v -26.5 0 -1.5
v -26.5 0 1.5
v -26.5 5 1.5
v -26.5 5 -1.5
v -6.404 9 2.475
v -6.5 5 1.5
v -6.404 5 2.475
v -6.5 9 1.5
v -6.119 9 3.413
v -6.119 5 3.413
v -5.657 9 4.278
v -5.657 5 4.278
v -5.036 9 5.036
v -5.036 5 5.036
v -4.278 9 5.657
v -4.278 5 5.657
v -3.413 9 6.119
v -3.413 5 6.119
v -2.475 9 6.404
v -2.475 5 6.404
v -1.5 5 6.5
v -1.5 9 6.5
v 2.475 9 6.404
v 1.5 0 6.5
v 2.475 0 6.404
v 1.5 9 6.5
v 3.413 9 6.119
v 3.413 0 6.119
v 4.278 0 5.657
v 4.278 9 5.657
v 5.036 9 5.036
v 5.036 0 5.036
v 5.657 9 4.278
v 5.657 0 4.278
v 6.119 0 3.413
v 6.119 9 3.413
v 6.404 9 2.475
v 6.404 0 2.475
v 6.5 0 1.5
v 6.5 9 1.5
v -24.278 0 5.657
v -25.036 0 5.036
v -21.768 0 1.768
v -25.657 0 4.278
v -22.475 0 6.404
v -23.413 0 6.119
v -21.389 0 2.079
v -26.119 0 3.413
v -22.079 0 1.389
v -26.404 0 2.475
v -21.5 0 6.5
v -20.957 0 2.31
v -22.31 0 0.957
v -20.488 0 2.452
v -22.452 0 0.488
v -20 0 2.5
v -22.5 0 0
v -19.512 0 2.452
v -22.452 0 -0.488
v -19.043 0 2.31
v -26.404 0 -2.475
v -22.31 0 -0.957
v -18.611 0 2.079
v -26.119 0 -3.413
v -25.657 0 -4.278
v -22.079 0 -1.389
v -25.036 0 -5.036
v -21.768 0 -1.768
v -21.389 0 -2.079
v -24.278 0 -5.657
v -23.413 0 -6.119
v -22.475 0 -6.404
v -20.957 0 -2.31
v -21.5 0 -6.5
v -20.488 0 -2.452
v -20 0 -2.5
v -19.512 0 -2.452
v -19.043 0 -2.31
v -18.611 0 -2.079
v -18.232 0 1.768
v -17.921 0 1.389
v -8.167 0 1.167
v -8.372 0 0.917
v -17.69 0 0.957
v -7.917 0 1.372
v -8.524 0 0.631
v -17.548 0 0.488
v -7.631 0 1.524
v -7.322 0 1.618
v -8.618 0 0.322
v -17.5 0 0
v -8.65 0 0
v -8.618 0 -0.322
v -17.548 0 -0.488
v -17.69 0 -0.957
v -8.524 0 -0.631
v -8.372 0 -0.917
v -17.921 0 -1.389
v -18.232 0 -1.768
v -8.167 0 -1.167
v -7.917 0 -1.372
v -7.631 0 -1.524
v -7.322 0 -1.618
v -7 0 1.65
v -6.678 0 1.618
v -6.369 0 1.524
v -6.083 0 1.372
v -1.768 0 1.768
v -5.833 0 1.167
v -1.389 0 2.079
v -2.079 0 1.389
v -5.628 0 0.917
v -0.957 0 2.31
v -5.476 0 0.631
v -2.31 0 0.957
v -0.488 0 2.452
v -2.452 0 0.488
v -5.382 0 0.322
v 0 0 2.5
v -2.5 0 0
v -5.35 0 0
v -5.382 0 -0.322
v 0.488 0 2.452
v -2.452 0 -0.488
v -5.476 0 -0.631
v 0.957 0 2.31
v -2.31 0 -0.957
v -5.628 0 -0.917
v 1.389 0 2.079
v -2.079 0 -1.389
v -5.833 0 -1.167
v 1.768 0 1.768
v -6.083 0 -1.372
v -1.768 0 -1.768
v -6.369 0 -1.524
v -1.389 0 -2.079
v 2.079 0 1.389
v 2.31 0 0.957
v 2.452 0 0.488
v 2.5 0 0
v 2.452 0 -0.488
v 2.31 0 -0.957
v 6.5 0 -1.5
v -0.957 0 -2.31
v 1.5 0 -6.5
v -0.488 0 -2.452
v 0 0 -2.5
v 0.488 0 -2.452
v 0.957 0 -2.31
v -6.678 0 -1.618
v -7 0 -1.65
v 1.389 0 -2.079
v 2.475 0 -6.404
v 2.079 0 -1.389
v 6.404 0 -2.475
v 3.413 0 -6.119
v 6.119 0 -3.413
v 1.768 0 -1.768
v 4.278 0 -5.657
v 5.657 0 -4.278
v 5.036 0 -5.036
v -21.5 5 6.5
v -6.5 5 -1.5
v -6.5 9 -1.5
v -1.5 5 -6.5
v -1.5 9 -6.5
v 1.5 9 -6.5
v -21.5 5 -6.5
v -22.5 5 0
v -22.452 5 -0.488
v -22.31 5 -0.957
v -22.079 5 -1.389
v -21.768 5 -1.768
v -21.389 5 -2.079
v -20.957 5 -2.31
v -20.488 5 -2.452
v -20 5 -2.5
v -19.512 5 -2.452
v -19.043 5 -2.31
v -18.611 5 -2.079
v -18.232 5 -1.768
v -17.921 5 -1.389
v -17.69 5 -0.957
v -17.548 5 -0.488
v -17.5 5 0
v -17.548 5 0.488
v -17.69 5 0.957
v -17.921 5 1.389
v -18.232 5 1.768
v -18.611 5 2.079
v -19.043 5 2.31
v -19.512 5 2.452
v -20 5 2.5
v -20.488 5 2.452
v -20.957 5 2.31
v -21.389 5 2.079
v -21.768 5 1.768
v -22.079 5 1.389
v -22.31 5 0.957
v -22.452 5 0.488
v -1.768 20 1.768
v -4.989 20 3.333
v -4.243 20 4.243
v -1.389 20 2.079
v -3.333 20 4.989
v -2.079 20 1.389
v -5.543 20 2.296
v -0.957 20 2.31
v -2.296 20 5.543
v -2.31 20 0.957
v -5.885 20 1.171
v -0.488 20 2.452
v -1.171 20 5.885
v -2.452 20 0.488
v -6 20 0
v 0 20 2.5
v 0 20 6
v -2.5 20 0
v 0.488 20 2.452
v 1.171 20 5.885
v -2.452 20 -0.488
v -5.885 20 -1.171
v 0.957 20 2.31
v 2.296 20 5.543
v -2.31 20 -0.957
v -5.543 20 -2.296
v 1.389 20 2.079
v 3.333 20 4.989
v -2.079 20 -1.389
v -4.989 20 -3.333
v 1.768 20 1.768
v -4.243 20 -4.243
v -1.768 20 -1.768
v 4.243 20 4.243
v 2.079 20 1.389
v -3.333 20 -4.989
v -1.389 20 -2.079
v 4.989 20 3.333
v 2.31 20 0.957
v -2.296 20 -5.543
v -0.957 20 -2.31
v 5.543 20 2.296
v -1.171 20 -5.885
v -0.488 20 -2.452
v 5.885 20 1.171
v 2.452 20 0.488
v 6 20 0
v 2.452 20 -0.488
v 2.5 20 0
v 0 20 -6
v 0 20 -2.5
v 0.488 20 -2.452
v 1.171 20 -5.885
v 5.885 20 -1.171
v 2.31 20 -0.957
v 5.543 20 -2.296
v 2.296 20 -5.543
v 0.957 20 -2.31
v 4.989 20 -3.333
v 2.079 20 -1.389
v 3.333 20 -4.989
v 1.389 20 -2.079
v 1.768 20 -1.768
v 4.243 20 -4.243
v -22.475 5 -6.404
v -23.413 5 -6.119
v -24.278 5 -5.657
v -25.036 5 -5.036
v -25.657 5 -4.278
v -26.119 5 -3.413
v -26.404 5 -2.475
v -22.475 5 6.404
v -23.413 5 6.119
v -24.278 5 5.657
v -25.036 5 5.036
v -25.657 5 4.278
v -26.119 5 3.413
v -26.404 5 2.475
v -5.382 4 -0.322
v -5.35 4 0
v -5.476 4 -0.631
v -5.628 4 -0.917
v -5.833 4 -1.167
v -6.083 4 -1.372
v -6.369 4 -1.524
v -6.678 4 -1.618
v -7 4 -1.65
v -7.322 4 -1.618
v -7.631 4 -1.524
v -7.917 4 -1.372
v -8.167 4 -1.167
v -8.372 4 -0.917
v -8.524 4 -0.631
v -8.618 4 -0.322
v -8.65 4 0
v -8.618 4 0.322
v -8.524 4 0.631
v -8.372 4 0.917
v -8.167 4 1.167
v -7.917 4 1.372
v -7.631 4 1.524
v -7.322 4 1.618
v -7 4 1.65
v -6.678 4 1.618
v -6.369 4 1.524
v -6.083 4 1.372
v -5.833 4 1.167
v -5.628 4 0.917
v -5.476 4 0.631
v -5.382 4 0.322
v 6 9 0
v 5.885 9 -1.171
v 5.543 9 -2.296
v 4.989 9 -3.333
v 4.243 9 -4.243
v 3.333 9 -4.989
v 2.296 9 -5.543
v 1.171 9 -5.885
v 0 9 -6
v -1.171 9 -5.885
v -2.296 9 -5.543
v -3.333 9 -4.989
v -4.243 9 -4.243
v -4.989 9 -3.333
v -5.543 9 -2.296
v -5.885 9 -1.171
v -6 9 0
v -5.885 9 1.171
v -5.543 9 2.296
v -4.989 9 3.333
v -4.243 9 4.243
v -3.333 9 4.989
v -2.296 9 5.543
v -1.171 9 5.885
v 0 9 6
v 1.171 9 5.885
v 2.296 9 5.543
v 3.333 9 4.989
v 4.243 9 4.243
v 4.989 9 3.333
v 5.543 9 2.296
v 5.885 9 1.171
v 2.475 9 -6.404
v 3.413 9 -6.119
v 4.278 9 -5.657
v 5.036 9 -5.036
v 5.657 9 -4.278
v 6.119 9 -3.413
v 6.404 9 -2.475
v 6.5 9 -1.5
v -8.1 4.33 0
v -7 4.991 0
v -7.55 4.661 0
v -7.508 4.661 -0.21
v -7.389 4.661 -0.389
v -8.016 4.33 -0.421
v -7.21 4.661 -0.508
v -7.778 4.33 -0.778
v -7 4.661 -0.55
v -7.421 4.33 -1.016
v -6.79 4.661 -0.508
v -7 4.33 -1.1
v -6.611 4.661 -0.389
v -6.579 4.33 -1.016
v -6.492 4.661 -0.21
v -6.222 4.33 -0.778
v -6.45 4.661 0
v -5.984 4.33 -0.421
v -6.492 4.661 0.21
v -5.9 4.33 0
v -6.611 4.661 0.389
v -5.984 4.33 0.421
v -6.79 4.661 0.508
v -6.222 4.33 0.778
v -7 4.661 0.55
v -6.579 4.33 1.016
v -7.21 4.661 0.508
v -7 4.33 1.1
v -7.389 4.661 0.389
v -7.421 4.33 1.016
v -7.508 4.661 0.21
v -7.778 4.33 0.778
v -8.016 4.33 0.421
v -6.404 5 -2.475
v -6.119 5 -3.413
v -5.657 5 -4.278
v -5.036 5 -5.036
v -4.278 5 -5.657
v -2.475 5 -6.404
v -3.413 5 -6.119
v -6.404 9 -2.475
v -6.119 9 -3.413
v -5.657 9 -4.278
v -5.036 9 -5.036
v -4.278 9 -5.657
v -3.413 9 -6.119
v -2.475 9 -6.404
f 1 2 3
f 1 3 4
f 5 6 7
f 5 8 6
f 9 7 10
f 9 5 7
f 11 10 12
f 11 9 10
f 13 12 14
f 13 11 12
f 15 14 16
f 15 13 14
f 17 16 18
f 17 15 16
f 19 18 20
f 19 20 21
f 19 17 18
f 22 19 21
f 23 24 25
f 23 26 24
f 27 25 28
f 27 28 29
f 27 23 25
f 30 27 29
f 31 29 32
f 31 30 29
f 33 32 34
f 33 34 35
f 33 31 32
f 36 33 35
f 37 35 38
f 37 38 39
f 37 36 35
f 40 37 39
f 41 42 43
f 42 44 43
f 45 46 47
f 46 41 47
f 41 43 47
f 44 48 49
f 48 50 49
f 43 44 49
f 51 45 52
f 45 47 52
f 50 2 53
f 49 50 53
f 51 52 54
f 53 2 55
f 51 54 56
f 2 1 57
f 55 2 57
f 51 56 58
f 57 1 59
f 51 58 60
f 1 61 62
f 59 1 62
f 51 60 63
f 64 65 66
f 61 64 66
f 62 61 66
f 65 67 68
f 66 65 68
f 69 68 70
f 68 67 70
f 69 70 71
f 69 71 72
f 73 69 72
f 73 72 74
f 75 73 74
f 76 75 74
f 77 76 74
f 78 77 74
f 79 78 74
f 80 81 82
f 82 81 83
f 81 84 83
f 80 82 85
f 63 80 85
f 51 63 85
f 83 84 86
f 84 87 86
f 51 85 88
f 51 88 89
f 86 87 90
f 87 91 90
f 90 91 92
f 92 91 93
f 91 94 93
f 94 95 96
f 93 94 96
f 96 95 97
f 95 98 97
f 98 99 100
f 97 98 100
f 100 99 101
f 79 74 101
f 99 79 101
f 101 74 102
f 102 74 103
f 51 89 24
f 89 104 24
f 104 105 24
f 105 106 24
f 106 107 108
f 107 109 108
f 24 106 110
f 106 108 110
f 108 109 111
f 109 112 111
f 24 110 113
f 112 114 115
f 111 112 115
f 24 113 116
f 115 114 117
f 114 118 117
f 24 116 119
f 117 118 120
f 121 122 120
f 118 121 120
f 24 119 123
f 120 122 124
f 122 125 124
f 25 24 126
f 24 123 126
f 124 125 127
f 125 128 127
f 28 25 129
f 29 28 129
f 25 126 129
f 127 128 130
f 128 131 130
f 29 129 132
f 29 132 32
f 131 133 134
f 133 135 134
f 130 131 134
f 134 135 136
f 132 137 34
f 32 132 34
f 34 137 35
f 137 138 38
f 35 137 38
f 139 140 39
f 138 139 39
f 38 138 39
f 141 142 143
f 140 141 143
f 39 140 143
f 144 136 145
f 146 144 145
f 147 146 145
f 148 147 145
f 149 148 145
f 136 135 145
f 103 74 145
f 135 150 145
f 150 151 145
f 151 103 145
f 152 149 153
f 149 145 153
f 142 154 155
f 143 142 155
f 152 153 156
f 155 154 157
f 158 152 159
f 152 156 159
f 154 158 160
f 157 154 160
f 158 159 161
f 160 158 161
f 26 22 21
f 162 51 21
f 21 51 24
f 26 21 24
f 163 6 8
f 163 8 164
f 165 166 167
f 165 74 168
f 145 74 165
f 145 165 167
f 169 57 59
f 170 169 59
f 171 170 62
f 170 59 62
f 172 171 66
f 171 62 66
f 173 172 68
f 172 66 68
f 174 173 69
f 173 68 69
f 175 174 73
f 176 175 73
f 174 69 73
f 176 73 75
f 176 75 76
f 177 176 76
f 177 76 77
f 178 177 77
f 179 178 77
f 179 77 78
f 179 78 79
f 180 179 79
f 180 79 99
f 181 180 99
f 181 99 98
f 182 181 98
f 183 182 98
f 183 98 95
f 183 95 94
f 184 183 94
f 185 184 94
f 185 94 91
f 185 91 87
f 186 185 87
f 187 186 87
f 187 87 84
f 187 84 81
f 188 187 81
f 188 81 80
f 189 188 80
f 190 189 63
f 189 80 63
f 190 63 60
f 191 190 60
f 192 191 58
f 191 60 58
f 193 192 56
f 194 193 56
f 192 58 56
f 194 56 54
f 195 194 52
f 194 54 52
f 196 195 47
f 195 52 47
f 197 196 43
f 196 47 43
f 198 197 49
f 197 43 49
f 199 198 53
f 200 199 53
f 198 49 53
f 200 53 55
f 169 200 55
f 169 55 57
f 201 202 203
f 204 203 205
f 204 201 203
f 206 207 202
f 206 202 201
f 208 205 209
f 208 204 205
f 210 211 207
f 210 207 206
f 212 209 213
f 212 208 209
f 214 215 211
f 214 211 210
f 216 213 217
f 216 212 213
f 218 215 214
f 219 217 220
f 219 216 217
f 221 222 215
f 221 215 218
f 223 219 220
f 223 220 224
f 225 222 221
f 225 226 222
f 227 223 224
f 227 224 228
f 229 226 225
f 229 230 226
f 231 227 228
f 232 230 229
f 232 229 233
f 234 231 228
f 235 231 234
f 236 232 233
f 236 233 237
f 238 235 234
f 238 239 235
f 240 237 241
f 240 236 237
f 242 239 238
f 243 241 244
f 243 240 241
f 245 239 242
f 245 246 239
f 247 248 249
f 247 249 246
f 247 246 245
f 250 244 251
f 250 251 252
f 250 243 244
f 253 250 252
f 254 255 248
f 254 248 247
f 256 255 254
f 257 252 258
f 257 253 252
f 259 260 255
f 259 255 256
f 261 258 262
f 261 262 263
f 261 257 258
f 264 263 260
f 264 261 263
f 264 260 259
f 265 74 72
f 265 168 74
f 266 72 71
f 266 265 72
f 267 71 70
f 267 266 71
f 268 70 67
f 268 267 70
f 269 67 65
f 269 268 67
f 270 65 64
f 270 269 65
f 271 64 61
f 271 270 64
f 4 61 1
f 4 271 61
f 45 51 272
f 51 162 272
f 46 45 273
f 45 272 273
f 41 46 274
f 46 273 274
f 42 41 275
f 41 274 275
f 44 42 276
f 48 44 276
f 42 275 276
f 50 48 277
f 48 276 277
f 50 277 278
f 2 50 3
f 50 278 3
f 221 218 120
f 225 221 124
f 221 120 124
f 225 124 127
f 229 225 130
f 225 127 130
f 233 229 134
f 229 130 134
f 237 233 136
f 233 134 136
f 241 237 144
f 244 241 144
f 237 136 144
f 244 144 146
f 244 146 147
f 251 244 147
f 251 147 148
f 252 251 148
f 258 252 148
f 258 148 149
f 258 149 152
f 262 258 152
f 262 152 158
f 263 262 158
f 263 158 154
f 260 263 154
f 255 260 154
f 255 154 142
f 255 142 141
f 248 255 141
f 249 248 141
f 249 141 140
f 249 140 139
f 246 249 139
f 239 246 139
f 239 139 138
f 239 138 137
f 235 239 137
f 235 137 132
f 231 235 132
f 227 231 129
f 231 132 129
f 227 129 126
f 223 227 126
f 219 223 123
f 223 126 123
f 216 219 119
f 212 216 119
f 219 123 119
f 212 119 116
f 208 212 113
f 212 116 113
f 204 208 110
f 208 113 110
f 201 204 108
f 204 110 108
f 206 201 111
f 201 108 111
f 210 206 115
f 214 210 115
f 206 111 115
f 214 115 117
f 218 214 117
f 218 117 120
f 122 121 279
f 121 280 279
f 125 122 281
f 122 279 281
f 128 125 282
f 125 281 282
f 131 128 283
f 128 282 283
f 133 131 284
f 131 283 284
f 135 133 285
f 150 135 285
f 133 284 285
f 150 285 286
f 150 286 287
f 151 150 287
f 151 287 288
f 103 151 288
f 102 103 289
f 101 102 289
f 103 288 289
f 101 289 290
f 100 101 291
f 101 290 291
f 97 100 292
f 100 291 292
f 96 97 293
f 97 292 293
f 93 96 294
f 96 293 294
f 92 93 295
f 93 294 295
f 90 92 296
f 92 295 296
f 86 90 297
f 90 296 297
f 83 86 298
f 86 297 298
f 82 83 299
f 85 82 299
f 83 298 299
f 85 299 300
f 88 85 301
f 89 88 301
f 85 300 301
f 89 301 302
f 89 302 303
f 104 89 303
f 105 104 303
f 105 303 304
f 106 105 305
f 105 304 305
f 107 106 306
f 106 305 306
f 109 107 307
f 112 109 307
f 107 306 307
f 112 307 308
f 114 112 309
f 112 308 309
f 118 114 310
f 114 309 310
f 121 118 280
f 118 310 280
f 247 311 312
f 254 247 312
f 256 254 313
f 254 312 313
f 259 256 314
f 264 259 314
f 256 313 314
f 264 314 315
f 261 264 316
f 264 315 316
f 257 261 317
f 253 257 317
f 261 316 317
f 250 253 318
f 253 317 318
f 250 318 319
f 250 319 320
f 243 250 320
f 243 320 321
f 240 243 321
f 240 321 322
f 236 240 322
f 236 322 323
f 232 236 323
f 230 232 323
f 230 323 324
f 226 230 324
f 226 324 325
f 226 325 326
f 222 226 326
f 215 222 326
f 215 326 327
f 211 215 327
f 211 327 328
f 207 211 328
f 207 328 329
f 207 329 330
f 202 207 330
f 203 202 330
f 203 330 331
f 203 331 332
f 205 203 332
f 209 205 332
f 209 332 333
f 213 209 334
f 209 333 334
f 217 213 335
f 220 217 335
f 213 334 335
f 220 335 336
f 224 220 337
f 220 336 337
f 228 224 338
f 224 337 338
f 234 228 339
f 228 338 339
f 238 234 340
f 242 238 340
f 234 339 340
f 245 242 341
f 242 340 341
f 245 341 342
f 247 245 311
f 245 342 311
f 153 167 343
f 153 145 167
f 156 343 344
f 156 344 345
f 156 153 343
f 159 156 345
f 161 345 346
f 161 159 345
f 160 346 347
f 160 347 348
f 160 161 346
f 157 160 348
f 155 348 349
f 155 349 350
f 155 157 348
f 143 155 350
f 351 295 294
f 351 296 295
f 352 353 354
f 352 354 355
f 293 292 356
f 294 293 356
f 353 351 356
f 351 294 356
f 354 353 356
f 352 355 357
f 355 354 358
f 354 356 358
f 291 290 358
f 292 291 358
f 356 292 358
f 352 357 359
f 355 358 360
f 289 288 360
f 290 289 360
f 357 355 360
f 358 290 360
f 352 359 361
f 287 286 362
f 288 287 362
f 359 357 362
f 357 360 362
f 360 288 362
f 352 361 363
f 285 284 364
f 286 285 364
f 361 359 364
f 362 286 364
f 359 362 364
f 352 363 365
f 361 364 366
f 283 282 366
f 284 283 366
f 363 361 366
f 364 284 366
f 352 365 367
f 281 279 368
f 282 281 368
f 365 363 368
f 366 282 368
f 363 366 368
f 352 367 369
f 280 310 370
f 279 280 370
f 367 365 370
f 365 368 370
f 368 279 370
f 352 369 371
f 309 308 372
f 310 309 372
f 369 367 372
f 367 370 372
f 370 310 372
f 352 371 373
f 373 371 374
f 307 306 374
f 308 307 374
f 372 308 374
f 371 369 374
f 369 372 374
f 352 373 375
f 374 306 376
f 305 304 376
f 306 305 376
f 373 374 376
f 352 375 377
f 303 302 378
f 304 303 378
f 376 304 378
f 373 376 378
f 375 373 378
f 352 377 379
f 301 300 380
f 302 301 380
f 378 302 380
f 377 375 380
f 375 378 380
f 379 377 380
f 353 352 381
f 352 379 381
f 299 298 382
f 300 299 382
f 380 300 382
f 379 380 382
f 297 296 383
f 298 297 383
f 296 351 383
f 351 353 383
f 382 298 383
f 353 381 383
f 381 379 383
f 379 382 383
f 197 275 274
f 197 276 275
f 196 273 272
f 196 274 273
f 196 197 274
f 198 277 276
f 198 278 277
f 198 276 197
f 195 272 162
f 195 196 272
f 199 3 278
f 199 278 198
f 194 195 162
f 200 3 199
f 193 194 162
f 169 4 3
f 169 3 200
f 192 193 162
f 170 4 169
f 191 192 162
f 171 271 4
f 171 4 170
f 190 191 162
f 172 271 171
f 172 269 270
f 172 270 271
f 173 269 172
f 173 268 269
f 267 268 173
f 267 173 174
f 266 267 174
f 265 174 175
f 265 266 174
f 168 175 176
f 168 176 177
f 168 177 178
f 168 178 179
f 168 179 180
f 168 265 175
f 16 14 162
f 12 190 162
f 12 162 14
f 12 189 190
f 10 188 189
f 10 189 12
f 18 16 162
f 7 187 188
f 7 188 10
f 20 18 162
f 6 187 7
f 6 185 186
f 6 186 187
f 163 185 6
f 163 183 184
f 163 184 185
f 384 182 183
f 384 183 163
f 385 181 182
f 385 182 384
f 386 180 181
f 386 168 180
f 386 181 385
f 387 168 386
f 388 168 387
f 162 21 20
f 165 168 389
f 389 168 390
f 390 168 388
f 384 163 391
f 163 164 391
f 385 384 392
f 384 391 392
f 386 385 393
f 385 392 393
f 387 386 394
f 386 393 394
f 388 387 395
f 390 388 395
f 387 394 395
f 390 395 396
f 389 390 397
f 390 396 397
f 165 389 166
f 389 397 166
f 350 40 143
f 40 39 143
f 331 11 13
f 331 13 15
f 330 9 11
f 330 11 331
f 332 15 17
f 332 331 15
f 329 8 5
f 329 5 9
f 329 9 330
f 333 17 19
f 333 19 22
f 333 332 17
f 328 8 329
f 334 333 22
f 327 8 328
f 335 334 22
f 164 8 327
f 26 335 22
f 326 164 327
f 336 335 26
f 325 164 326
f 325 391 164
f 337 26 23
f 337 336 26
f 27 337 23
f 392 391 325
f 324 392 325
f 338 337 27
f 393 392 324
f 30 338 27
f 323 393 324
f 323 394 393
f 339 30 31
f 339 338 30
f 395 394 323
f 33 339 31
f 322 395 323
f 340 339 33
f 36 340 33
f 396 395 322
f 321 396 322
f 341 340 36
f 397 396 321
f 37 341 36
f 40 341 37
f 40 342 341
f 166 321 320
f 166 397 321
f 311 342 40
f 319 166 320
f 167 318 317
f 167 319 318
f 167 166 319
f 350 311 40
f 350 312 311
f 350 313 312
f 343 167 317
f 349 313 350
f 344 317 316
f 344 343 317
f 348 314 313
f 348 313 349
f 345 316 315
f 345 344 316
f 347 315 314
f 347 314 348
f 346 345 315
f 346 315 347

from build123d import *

# Parameters (mm, degrees)
SKETCH_1_W             = 33
SKETCH_1_H             = 13
SKETCH_1_R             = 2.23020675
EXTRUDE_1_DEPTH        = 5
SKETCH_1_5_R           = 6
EXTRUDE_2_DEPTH        = 20
HOLE_WIZARD_M6_1_D     = 5
HOLE_WIZARD_M6_2_D     = 5
SKETCH_10_W            = 13
SKETCH_10_H            = 13
SKETCH_10_R            = 6
EXTRUDE_3_DEPTH        = 4
HOLE_WIZARD_M4_1_D     = 3.3
HOLE_WIZARD_M4_1_DEPTH = 4
HOLE_WIZARD_M4_1_TIP   = 0.991420021
FILLET_1_R             = 5


with BuildPart() as part:
    # 草图1 → 凸台-拉伸1 (new body)
    with BuildSketch(Plane(origin=(0, 0, 0), x_dir=(1, 0, 0), z_dir=(0, 1, 0))):
        with Locations((-10, 0)):
            Rectangle(SKETCH_1_W, SKETCH_1_H)
        with Locations((-20, 0)):
            Circle(SKETCH_1_R, mode=Mode.SUBTRACT)
    extrude(amount=EXTRUDE_1_DEPTH)

    # 草图1<5> → 凸台-拉伸2 (add)
    with BuildSketch(Plane(origin=(0, 0, 0), x_dir=(1, 0, 0), z_dir=(0, 1, 0))):
        Circle(SKETCH_1_5_R)
    extrude(amount=EXTRUDE_2_DEPTH)

    # M6 螺纹孔1 (through all)
    with Locations(Plane(origin=(0, 20, 0), x_dir=(1, 0, 0), z_dir=(0, 1, 0))):
        with Locations((0, 0)):
            Hole(HOLE_WIZARD_M6_1_D / 2)

    # M6 螺纹孔2 (through all)
    with Locations(Plane(origin=(0, 5, 0), x_dir=(1, 0, 0), z_dir=(0, 1, 0))):
        with Locations((-20, 0)):
            Hole(HOLE_WIZARD_M6_2_D / 2)

    # 草图10 → 凸台-拉伸3 (add)
    with BuildSketch(Plane(origin=(0, 5, 0), x_dir=(1, 0, 0), z_dir=(0, 1, 0))):
        Rectangle(SKETCH_10_W, SKETCH_10_H)
        Circle(SKETCH_10_R, mode=Mode.SUBTRACT)
    extrude(amount=EXTRUDE_3_DEPTH)

    # M4 螺纹孔1
    with Locations(Plane(origin=(0, 0, 0), x_dir=(-1, 0, 0), z_dir=(0, -1, 0))):
        with Locations((7, 0)):
            Hole(HOLE_WIZARD_M4_1_D / 2, depth=HOLE_WIZARD_M4_1_DEPTH)
            with Locations((0, 0, -(HOLE_WIZARD_M4_1_DEPTH + HOLE_WIZARD_M4_1_TIP / 2))):  # 118° drill point
                Cone(0, HOLE_WIZARD_M4_1_D / 2, HOLE_WIZARD_M4_1_TIP, mode=Mode.SUBTRACT)

    # 圆角1
    fillet_1_edges = [part.edges().sort_by_distance(p)[0] for p in [
        (-26.5, 2.5, 6.5),
        (-26.5, 2.5, -6.5),
        (6.5, 4.5, -6.5),
        (6.5, 4.5, 6.5),
        (-6.5, 7, -6.5),
        (-6.5, 7, 6.5),
    ]]
    fillet(fillet_1_edges, radius=FILLET_1_R)


solid = part.part
